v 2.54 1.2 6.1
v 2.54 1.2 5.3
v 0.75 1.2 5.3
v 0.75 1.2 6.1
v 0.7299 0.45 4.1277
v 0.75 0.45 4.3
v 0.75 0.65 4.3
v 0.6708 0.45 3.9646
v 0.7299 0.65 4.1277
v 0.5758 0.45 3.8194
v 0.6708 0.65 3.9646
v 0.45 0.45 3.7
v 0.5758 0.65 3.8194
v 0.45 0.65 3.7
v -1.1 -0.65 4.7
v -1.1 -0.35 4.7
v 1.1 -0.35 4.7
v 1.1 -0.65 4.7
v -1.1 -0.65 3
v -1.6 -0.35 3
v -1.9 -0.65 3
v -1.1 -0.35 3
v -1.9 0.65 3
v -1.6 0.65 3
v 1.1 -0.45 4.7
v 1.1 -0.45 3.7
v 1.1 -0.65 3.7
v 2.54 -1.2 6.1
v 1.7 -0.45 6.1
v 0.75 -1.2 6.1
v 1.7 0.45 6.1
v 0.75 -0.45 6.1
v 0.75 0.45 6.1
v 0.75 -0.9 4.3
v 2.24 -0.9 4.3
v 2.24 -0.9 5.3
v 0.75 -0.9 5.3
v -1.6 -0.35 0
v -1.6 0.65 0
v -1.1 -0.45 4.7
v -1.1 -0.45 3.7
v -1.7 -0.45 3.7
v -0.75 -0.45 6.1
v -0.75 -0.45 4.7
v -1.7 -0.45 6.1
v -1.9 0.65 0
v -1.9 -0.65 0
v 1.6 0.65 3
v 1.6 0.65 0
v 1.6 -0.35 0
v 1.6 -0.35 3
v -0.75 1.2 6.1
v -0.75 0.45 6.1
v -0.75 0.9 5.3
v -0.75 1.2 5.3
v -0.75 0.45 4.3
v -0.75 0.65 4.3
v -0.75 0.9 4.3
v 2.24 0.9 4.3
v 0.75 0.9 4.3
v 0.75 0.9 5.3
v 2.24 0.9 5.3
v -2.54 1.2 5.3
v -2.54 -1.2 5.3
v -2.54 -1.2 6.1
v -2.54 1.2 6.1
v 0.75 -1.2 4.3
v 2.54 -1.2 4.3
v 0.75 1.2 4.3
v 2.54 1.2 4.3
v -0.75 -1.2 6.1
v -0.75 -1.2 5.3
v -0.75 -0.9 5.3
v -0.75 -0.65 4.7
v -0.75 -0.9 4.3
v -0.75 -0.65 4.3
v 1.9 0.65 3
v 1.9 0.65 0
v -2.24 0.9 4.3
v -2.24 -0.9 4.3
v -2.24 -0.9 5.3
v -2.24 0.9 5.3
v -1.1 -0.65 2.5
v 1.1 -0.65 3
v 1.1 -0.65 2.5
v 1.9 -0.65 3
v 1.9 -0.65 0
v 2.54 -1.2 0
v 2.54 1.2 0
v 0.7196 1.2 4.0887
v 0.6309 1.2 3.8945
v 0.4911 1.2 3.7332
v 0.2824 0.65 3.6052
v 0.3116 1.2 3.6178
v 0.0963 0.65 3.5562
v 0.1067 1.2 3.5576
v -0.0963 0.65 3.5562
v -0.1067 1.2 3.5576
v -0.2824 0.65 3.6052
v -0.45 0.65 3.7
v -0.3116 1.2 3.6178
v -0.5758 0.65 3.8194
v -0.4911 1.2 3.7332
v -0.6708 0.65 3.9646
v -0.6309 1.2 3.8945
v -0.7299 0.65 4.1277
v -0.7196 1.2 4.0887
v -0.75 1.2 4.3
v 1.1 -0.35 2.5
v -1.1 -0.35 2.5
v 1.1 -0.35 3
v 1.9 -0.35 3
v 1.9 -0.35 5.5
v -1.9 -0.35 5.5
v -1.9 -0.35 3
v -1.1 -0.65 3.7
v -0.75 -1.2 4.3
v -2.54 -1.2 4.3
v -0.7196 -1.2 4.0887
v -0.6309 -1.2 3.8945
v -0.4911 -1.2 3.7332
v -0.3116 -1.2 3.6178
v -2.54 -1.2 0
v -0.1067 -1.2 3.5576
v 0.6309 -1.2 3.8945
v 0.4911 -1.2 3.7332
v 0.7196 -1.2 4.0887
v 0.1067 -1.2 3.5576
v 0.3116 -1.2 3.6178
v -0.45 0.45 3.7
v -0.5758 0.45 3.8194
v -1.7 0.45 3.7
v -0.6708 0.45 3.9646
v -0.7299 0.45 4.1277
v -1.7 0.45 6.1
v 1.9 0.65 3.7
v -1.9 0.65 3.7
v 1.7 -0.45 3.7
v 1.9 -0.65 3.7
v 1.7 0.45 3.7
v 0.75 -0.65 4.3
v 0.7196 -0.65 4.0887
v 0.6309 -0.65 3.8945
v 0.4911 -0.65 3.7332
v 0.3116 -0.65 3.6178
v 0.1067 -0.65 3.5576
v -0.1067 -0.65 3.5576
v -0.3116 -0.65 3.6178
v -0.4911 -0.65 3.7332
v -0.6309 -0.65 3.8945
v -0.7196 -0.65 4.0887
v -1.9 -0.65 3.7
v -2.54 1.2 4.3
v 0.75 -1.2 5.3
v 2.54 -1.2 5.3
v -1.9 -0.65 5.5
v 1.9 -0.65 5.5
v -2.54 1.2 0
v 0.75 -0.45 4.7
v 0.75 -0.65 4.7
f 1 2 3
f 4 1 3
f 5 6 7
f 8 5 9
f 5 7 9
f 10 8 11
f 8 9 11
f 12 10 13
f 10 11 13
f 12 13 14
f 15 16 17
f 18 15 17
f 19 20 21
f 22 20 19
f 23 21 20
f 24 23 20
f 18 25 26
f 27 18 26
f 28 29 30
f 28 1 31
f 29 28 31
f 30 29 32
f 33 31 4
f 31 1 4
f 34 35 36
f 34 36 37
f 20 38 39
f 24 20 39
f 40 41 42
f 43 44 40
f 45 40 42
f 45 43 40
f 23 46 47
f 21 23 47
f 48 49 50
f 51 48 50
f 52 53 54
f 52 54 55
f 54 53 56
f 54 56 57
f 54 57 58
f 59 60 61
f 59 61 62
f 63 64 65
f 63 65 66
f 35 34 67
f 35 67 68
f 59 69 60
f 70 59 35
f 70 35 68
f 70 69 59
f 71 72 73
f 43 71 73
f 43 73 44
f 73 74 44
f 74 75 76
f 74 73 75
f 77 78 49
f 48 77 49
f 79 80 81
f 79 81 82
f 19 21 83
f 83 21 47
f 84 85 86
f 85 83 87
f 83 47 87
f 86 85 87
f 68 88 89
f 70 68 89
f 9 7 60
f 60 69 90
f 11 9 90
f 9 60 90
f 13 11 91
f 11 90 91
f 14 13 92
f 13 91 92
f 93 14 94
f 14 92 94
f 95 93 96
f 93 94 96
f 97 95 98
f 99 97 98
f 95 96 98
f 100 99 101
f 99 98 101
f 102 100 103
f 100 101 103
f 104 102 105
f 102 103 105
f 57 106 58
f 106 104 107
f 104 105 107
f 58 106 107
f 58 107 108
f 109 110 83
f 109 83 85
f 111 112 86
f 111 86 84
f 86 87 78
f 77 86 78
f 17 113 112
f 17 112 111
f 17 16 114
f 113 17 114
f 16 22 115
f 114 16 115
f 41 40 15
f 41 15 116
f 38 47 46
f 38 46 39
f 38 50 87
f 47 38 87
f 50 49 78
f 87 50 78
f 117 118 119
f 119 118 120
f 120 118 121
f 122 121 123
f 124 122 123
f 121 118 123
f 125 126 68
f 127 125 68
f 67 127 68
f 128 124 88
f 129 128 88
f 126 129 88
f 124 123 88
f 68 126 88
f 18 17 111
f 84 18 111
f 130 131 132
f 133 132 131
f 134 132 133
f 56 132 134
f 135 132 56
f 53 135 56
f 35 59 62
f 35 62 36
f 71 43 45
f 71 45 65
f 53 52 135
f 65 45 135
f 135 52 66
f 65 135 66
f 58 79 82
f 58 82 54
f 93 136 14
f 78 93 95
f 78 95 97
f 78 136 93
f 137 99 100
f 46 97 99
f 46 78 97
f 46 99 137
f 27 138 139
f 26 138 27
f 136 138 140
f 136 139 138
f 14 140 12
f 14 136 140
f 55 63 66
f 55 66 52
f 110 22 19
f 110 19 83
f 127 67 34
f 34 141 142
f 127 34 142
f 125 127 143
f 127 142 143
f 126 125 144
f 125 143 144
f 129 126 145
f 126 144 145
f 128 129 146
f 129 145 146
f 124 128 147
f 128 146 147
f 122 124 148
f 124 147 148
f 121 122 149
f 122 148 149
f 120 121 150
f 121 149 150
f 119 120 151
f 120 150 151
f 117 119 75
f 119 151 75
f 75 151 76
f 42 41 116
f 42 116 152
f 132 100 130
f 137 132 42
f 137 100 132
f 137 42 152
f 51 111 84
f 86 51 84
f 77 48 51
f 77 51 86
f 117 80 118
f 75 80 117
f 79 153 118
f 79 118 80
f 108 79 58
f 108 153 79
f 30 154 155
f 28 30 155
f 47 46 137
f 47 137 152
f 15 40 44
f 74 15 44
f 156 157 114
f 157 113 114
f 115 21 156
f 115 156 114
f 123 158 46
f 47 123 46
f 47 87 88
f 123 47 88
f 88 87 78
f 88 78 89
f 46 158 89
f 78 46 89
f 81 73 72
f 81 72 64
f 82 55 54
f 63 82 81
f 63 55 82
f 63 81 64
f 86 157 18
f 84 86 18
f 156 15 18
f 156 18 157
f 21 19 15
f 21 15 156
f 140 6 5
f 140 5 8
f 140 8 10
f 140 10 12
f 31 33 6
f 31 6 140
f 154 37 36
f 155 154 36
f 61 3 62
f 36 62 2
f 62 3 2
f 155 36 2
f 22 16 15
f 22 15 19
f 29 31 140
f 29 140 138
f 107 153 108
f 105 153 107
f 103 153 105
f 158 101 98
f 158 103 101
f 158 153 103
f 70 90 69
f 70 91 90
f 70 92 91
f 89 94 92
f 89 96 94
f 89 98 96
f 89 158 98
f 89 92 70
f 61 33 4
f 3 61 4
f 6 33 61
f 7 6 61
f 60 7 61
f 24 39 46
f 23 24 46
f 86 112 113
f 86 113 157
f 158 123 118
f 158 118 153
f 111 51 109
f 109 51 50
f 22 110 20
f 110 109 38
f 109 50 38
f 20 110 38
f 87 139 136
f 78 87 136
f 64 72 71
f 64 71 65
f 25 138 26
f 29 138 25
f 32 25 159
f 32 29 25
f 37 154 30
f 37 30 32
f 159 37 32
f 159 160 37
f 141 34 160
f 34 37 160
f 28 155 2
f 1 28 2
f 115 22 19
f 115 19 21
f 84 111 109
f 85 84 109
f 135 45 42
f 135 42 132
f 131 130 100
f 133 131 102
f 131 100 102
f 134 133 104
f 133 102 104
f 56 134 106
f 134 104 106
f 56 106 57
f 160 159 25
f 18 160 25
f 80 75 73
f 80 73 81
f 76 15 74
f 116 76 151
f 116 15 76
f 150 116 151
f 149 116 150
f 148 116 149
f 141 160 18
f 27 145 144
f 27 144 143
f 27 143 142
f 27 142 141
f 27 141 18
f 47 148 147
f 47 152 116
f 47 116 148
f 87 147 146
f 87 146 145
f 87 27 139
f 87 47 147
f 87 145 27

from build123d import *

# Parameters (mm, degrees)
SKETCH1_W           = 5.08
SKETCH1_H           = 2.4
SKETCH1_W_2         = 3.799999998
SKETCH1_H_2         = 1.299999999
BOSS_EXTRUDE1_DEPTH = 4.3
SKETCH3_R           = 0.75
CUT_EXTRUDE2_DEPTH  = 3.4
BOSS_EXTRUDE2_DEPTH = 1
BOSS_EXTRUDE3_DEPTH = 0.8
BOSS_EXTRUDE4_DEPTH = 2.4
CUT_EXTRUDE4_DEPTH  = 2.849999999
BOSS_EXTRUDE5_DEPTH = 3
BOSS_EXTRUDE8_DEPTH = 2.5
SKETCH14_W          = 2.199999998
SKETCH14_H          = 2.2
CUT_EXTRUDE5_DEPTH  = 0.3


with BuildPart() as part:
    # Sketch1 → Boss-Extrude1 (new body)
    with BuildSketch(Plane.XY):
        Rectangle(SKETCH1_W, SKETCH1_H)
        Rectangle(SKETCH1_W_2, SKETCH1_H_2, mode=Mode.SUBTRACT)
    extrude(amount=BOSS_EXTRUDE1_DEPTH)

    # Sketch3 → Cut-Extrude2 (cut, through all)
    with BuildSketch(Plane(origin=(0, 1.2, 0), x_dir=(1, 0, 0), z_dir=(0, 1, 0))):
        with Locations((0, -4.3)):
            Circle(SKETCH3_R)
    extrude(amount=-CUT_EXTRUDE2_DEPTH, mode=Mode.SUBTRACT)

    # Sketch6 → Boss-Extrude2 (add)
    with BuildSketch(Plane.XY.offset(4.3)):
        Polygon((-0.75, 0.9), (-0.75, 0.649999999), (-1.899999999, 0.649999999), (-1.899999999, -0.65), (-0.75, -0.65), (-0.75, -0.9), (-2.24, -0.9), (-2.24, 0.9), align=None)
        Polygon((2.24, 0.9), (2.24, -0.9), (0.75, -0.9), (0.75, -0.65), (1.899999999, -0.65), (1.899999999, 0.649999999), (0.75, 0.649999999), (0.75, 0.9), align=None)
    extrude(amount=BOSS_EXTRUDE2_DEPTH)

    # Sketch7 → Boss-Extrude3 (add)
    with BuildSketch(Plane.XY.offset(5.3)):
        Polygon((-0.75, 1.2), (-0.75, 0.9), (-0.75, 0.649999999), (-1.899999999, 0.649999999), (-1.899999999, -0.65), (-0.75, -0.65), (-0.75, -0.9), (-0.75, -1.2), (-2.54, -1.2), (-2.54, 1.2), align=None)
        Polygon((0.75, -0.9), (0.75, -1.2), (2.54, -1.2), (2.54, 1.2), (0.75, 1.2), (0.75, 0.9), (0.75, 0.649999999), (1.899999999, 0.649999999), (1.899999999, -0.65), (0.75, -0.65), align=None)
    extrude(amount=BOSS_EXTRUDE3_DEPTH)

    # Sketch9 → Boss-Extrude4 (add)
    with BuildSketch(Plane.XY.offset(6.1)):
        Polygon((0.75, 0.649999999), (1.899999999, 0.649999999), (1.899999999, -0.65), (0.75, -0.65), (-0.75, -0.65), (-1.899999999, -0.65), (-1.899999999, 0.649999999), (-0.75, 0.649999999), align=None)
        Polygon((-0.75, -0.45), (-1.699999999, -0.45), (-1.699999999, 0.449999999), (-0.75, 0.449999999), (0.75, 0.449999999), (1.699999999, 0.449999999), (1.699999999, -0.45), (0.75, -0.45), align=None, mode=Mode.SUBTRACT)
    extrude(amount=-BOSS_EXTRUDE4_DEPTH)

    # Sketch10 → Cut-Extrude4 (cut, through all)
    with BuildSketch(Plane(origin=(0, 0.649999999, 0), x_dir=(1, 0, 0), z_dir=(0, 1, 0))):
        with BuildLine():
            Line((0.75, -6.1), (0.75, -4.3))
            ThreePointArc((0.75, -4.3), (0.670820393, -3.964589803), (0.45, -3.7))
            ThreePointArc((0.45, -3.7), (0, -3.55), (-0.45, -3.7))
            ThreePointArc((-0.45, -3.7), (-0.670820393, -3.964589803), (-0.75, -4.3))
            Line((-0.75, -4.3), (-0.75, -6.1))
            Line((-0.75, -6.1), (0.75, -6.1))
        make_face()
    extrude(amount=-CUT_EXTRUDE4_DEPTH, mode=Mode.SUBTRACT)


with BuildPart() as body_2:
    # Sketch12 → Boss-Extrude5 (new body)
    with BuildSketch(Plane(origin=(0, 0, 0), x_dir=(-1, 0, 0), z_dir=(0, 0, -1))):
        Polygon((1.899999999, 0.649999999), (1.899999999, -0.65), (-1.899999999, -0.65), (-1.899999999, 0.649999999), (-1.599999999, 0.649999999), (-1.599999999, -0.35), (1.599999999, -0.35), (1.599999999, 0.649999999), align=None)
    extrude(amount=-BOSS_EXTRUDE5_DEPTH)


with BuildPart() as body_3:
    # Sketch13 → Boss-Extrude8 (new body)
    with BuildSketch(Plane.XY.offset(3)):
        Polygon((1.899999999, -0.65), (-1.899999999, -0.65), (-1.899999999, -0.35), (-1.599999999, -0.35), (1.599999999, -0.35), (1.899999999, -0.35), align=None)
    extrude(amount=BOSS_EXTRUDE8_DEPTH)


with BuildPart() as cut_extrude5_tool:
    # Sketch14 → Cut-Extrude5 (new body)
    with BuildSketch(Plane(origin=(0, -0.35, 0), x_dir=(1, 0, 0), z_dir=(0, 1, 0))):
        with Locations((0, -3.6)):
            Rectangle(SKETCH14_W, SKETCH14_H)
    extrude(amount=-CUT_EXTRUDE5_DEPTH)


with BuildPart() as part_1:
    add(part.part)

    # Cut-Extrude5: cut by cut_extrude5_tool
    add(cut_extrude5_tool.part, mode=Mode.SUBTRACT)


with BuildPart() as body_2_1:
    add(body_2.part)

    # Cut-Extrude5: cut by cut_extrude5_tool
    add(cut_extrude5_tool.part, mode=Mode.SUBTRACT)


with BuildPart() as body_3_1:
    add(body_3.part)

    # Cut-Extrude5: cut by cut_extrude5_tool
    add(cut_extrude5_tool.part, mode=Mode.SUBTRACT)


solid = Compound([part_1.part, body_2_1.part, body_3_1.part])
